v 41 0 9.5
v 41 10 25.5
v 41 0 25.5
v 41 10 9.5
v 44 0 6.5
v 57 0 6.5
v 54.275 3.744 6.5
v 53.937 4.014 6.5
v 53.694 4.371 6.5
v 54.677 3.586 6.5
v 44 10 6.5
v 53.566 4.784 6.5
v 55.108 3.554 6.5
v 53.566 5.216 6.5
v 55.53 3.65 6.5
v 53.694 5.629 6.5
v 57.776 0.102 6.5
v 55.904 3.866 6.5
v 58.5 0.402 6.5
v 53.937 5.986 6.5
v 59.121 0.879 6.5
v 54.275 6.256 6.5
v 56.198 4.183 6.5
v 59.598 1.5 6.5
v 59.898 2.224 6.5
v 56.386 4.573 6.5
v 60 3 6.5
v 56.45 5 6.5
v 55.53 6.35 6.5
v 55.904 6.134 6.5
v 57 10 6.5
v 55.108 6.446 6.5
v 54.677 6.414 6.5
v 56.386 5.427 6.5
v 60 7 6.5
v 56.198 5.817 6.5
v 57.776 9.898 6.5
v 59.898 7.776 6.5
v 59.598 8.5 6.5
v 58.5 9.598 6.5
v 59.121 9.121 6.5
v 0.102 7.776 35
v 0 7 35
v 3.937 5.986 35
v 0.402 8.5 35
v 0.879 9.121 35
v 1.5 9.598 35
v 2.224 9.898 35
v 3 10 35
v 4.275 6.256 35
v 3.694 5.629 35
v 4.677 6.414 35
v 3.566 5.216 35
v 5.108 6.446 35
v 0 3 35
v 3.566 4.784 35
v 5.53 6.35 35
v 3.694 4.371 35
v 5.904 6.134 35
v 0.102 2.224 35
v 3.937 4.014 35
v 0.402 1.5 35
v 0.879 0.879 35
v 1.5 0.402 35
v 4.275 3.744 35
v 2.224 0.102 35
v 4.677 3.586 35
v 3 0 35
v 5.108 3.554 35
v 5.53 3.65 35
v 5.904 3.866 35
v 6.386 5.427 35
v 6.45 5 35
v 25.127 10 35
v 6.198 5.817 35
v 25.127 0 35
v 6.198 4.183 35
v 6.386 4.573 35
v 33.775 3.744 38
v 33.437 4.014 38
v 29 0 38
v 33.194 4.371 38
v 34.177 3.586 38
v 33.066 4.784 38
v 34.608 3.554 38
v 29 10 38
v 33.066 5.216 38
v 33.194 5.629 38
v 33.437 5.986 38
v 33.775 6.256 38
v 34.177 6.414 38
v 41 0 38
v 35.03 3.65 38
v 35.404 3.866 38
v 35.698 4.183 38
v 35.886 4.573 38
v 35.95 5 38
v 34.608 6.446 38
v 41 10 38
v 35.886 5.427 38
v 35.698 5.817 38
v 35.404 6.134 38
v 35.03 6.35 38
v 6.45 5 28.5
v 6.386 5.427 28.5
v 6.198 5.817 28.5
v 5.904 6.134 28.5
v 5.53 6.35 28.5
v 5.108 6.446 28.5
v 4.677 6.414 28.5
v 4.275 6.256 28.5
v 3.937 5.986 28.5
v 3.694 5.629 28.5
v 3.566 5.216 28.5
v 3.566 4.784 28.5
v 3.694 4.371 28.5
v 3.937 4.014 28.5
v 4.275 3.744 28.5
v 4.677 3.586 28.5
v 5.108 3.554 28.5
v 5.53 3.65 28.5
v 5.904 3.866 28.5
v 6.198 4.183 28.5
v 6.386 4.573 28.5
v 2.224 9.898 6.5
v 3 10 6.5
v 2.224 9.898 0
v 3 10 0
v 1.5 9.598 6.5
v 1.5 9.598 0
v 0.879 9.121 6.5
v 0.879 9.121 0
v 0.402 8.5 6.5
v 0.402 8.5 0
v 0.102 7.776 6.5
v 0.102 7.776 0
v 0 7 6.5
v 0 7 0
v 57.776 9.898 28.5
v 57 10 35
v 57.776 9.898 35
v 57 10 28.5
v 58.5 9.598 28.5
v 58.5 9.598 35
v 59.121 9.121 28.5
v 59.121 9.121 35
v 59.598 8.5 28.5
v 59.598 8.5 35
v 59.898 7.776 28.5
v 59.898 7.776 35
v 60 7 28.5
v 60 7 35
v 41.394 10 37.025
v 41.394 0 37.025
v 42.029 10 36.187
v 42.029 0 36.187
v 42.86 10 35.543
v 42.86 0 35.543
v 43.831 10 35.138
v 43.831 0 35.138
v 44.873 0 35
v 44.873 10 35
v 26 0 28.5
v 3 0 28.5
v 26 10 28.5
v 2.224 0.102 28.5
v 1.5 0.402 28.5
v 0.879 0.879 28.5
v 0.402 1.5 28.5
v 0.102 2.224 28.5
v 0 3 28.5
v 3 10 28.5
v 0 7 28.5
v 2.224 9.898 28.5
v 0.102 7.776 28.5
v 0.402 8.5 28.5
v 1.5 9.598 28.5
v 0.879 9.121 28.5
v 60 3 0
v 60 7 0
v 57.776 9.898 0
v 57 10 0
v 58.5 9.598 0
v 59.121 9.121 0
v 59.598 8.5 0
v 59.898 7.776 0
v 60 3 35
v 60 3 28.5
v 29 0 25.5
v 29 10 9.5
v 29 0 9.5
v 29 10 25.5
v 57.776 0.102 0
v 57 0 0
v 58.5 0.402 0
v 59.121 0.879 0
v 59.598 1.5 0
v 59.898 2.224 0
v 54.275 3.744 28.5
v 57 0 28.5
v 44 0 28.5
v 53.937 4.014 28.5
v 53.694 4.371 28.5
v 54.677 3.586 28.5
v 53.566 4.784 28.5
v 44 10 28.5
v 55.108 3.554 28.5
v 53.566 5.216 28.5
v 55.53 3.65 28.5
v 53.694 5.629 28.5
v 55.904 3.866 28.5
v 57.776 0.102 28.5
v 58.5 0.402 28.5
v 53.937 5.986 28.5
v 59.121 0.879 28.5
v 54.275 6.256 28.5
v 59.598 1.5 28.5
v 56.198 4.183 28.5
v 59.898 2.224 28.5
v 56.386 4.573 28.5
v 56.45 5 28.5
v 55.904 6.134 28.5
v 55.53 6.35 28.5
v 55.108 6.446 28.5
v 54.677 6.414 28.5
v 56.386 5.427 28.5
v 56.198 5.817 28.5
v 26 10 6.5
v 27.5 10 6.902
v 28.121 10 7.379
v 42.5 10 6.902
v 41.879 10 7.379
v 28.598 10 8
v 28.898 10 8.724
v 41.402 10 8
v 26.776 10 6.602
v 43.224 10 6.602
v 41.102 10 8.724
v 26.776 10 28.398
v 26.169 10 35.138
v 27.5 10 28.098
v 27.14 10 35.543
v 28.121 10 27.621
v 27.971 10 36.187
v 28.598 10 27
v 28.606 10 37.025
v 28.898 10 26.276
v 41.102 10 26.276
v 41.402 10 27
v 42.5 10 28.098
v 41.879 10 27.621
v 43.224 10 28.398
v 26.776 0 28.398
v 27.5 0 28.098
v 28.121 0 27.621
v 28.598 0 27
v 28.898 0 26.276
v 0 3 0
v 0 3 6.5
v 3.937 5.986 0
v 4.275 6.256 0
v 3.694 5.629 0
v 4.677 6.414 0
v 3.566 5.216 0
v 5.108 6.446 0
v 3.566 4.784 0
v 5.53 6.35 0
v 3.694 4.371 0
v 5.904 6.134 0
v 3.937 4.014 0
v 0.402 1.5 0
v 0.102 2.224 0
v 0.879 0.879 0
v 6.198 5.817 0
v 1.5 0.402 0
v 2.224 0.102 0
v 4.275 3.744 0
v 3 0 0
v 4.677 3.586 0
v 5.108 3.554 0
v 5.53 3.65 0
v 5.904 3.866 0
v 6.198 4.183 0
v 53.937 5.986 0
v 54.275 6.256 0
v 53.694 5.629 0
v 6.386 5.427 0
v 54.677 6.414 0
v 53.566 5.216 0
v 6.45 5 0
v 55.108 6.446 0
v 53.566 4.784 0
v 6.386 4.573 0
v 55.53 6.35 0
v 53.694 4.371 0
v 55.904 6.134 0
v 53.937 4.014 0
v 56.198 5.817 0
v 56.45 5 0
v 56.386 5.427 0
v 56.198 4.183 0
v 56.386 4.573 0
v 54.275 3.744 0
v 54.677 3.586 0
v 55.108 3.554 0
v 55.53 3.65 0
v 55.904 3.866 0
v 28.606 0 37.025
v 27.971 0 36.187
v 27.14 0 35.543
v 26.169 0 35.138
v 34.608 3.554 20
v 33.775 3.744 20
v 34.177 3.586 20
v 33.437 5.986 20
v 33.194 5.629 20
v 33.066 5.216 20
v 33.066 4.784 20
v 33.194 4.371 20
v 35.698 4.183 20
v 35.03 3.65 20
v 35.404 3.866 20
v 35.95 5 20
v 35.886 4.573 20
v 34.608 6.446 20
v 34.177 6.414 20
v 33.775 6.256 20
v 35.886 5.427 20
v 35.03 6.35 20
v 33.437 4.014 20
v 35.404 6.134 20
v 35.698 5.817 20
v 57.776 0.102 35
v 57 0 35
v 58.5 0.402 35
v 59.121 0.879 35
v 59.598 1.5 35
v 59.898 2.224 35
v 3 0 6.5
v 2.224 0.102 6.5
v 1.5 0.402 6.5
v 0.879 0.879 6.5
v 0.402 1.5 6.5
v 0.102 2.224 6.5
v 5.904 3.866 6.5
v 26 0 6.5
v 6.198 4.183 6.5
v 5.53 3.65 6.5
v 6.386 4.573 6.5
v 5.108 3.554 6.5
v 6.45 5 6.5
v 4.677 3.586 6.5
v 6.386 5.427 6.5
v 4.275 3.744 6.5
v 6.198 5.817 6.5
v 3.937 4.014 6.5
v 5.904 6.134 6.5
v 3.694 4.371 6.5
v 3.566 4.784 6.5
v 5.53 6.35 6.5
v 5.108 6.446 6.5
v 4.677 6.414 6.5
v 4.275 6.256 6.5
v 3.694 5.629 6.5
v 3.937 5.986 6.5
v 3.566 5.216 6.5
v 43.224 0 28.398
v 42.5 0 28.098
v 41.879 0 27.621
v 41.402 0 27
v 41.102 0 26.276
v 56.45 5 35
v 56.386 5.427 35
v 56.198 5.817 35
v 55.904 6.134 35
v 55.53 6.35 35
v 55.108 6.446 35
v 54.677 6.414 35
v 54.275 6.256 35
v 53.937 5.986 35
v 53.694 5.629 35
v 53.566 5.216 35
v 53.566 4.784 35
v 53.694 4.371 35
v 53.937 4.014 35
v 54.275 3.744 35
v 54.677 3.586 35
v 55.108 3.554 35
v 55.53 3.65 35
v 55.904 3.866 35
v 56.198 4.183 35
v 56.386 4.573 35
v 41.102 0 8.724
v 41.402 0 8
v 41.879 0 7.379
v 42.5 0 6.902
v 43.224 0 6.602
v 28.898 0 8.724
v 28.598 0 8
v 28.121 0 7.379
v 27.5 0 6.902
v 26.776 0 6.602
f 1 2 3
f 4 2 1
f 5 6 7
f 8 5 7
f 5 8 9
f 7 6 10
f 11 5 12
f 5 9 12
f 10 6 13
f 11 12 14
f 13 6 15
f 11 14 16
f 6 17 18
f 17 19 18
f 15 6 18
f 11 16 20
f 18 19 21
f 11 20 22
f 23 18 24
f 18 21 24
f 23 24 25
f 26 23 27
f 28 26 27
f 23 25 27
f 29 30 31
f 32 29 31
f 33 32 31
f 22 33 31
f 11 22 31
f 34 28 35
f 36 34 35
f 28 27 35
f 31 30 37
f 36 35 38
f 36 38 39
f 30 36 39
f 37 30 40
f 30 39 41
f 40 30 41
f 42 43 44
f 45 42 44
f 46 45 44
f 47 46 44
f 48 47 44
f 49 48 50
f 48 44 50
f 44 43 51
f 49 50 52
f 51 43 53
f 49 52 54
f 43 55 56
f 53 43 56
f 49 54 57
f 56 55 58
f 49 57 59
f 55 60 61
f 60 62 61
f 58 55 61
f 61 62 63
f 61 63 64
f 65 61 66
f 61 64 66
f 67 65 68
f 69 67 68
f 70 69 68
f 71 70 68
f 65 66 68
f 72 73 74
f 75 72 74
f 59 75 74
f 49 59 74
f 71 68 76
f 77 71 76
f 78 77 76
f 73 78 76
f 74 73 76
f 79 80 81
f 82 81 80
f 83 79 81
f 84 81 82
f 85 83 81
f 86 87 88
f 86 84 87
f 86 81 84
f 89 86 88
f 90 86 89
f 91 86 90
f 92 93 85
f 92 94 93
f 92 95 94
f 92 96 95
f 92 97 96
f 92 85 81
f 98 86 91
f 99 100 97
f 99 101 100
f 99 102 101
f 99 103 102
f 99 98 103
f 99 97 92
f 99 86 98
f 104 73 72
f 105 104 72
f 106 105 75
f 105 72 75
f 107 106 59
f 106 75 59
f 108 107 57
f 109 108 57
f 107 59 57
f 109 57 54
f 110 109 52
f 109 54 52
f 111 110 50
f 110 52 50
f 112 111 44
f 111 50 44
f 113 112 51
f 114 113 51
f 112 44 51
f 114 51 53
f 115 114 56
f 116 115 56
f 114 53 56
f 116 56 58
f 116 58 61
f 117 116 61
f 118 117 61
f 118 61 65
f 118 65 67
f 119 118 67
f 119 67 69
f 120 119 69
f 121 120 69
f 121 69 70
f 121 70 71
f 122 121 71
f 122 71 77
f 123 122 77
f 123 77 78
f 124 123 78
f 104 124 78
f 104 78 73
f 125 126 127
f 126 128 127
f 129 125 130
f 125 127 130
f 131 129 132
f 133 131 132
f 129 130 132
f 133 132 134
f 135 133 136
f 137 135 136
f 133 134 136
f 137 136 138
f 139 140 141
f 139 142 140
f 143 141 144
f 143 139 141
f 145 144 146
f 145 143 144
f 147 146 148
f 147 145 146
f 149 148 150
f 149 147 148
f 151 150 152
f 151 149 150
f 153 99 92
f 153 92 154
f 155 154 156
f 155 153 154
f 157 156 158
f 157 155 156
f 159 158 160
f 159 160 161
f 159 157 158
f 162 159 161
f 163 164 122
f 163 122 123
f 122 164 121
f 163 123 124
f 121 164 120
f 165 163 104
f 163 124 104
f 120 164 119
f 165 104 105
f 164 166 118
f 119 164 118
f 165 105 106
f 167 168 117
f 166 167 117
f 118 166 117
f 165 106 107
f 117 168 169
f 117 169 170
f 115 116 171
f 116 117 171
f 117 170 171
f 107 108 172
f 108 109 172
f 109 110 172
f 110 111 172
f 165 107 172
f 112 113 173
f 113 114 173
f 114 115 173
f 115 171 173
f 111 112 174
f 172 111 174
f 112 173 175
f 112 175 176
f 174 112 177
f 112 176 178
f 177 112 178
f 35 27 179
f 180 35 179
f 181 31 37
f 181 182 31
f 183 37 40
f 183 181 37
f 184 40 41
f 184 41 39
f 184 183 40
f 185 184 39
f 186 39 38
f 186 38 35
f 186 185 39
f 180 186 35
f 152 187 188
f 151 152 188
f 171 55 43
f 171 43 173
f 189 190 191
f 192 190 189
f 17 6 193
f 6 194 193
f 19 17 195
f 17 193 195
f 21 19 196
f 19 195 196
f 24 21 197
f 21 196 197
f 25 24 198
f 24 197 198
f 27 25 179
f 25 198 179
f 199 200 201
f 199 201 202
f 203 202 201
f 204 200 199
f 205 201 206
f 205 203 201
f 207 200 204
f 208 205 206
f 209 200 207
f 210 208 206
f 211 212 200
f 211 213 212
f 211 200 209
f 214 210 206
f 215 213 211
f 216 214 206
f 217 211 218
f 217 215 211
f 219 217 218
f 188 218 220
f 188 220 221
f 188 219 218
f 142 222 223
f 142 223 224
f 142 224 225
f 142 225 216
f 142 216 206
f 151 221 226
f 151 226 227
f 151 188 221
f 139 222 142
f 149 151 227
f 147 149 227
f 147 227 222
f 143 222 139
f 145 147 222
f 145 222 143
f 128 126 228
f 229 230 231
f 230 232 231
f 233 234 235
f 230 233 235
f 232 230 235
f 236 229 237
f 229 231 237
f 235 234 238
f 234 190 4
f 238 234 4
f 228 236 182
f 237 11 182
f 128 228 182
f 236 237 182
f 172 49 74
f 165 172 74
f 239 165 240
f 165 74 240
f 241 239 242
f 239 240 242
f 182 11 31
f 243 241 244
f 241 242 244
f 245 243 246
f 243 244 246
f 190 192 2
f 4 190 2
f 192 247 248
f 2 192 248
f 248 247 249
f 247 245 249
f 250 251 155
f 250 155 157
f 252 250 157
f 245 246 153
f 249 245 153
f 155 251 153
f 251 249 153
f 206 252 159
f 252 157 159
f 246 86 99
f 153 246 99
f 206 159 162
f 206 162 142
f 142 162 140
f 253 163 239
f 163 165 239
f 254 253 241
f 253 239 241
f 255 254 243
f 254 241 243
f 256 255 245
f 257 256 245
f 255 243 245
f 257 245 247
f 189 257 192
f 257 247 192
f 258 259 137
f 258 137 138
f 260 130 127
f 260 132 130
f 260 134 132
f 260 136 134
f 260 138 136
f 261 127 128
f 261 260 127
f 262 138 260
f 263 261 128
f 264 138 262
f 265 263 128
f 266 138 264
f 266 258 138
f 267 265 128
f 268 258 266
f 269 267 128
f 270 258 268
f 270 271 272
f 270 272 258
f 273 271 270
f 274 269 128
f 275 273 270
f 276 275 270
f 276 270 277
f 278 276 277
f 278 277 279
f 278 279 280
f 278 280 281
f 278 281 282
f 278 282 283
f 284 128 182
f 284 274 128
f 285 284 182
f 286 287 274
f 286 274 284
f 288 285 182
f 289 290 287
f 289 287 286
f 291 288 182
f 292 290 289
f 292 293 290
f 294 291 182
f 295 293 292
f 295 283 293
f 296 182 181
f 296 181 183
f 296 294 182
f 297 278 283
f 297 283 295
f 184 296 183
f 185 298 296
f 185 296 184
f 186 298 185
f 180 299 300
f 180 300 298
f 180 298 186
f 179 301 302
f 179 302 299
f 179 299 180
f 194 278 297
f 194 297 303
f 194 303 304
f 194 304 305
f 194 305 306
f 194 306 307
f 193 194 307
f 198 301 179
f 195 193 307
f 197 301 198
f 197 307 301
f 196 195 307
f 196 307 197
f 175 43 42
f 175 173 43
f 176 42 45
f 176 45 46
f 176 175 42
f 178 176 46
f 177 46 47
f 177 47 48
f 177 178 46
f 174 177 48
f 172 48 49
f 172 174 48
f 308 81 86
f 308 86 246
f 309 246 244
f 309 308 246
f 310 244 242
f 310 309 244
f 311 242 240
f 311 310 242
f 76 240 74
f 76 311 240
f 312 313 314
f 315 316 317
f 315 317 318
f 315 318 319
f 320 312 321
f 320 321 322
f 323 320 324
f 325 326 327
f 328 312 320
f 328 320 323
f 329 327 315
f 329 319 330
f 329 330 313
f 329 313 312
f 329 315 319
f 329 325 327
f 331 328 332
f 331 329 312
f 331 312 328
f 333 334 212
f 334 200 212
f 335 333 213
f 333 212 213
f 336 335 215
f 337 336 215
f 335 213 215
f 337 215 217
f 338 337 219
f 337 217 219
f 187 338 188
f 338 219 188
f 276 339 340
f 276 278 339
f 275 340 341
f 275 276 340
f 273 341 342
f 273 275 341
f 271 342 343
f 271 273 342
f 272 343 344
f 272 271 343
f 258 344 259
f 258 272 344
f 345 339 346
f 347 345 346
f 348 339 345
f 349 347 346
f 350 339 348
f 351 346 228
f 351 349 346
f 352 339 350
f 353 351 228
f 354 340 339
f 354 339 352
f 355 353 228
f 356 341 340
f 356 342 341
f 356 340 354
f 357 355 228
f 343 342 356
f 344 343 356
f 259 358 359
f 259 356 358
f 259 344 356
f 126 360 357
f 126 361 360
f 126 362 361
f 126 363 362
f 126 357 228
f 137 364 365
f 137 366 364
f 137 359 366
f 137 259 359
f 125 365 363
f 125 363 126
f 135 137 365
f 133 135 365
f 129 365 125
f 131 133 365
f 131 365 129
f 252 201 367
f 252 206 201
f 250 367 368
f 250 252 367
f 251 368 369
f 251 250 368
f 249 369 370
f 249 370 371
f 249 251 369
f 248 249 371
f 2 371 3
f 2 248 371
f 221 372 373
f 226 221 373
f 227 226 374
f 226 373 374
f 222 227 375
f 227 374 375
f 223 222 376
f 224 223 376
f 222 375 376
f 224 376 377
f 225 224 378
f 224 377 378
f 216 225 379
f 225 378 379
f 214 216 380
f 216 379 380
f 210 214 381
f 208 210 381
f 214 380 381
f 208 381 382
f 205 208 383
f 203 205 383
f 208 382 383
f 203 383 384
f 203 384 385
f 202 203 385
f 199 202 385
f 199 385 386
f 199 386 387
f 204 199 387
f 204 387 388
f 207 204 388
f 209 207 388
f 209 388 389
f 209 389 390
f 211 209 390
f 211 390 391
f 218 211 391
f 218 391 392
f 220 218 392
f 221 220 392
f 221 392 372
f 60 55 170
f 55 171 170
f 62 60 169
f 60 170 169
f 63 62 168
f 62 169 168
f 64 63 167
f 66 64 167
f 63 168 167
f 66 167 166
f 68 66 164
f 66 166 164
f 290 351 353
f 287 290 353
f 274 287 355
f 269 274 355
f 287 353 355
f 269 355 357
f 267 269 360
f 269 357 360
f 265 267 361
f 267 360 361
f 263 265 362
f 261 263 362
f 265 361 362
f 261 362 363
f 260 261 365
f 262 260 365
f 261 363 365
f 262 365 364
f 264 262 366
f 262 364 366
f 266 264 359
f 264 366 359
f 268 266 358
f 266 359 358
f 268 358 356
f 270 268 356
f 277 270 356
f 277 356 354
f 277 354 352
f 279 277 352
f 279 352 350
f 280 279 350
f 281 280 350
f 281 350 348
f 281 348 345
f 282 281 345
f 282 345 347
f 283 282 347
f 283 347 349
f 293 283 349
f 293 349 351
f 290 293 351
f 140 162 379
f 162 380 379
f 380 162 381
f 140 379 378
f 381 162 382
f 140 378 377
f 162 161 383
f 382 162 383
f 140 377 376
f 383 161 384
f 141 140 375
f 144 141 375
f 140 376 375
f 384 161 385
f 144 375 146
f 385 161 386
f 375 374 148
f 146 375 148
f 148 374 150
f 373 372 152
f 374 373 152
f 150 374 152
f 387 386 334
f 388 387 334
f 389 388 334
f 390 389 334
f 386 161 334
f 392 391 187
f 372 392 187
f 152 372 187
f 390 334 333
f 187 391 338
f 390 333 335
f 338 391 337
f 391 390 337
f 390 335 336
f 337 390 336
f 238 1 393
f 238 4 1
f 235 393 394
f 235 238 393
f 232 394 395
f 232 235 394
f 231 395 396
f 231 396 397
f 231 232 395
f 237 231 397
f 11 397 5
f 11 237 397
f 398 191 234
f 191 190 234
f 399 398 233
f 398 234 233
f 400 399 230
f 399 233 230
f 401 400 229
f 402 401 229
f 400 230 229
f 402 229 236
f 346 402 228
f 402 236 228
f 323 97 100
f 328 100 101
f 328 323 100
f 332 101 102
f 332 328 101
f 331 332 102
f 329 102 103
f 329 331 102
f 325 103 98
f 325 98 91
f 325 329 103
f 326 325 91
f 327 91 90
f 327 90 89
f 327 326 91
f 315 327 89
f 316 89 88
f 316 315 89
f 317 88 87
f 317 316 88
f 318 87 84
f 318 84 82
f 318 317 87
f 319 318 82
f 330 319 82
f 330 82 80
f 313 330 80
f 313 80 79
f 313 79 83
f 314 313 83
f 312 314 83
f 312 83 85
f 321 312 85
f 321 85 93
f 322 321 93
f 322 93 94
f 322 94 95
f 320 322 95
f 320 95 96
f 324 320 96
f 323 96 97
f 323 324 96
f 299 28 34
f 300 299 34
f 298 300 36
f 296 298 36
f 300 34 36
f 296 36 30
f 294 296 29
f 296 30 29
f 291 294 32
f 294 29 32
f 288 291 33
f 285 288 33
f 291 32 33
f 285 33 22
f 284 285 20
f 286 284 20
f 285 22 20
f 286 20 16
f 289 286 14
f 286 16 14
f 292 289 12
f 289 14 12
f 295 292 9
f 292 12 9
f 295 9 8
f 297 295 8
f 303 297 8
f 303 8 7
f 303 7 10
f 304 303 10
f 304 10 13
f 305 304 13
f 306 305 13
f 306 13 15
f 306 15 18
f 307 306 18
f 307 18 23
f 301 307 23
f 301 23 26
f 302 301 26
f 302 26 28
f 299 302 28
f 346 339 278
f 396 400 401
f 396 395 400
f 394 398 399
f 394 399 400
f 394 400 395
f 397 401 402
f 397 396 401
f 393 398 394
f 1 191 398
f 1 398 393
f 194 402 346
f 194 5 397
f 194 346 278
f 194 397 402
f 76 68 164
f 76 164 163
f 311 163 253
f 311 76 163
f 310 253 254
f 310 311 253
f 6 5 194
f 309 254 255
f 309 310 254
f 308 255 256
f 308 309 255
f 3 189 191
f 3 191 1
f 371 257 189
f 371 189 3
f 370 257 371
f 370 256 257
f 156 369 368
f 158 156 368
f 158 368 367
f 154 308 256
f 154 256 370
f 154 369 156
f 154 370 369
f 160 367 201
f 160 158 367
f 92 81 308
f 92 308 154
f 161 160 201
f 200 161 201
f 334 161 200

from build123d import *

# Parameters (mm, degrees)
SKETCH1_W               = 60
SKETCH1_H               = 35
BOSS_EXTRUDE1_DEPTH     = 10
SKETCH2_W               = 22
SKETCH2_H               = 10
CUT_EXTRUDE1_DEPTH      = 19
SKETCH3_W               = 22
SKETCH3_H               = 10
CUT_EXTRUDE2_DEPTH      = 29
SKETCH5_R               = 1.45
CUT_EXTRUDE4_DEPTH      = 71.178344238
FILLET1_R               = 3
FILLET2_R               = 3
SKETCH7_W               = 12
SKETCH7_H               = 10
BOSS_EXTRUDE2_DEPTH     = 3
CUT_EXTRUDE5_DEPTH      = 3
CUT_EXTRUDE5_DEPTH_BACK = 15
SKETCH6_R               = 1.45
FILLET3_R               = 4


with BuildPart() as part:
    # Sketch1 → Boss-Extrude1 (new body)
    with BuildSketch(Plane(origin=(0, 0, 0), x_dir=(1, 0, 0), z_dir=(0, 1, 0))):
        with Locations((30, -17.5)):
            Rectangle(SKETCH1_W, SKETCH1_H)
    extrude(amount=BOSS_EXTRUDE1_DEPTH)

    # Sketch2 → Cut-Extrude1 (cut)
    with BuildSketch(Plane(origin=(60, 0, 0), x_dir=(0, 0, -1), z_dir=(1, 0, 0))):
        with Locations((-17.5, 5)):
            Rectangle(SKETCH2_W, SKETCH2_H)
    extrude(amount=-CUT_EXTRUDE1_DEPTH, mode=Mode.SUBTRACT)

    # Sketch3 → Cut-Extrude2 (cut)
    with BuildSketch(Plane.ZY):
        with Locations((17.5, 5)):
            Rectangle(SKETCH3_W, SKETCH3_H)
    extrude(amount=-CUT_EXTRUDE2_DEPTH, mode=Mode.SUBTRACT)

    # Sketch5 → Cut-Extrude4 (cut, through all)
    with BuildSketch(Plane.XY.offset(35)):
        with Locations((5, 5)):
            Circle(SKETCH5_R)
        with Locations((55, 5)):
            Circle(SKETCH5_R)
    extrude(amount=-CUT_EXTRUDE4_DEPTH, mode=Mode.SUBTRACT)

    # Fillet1
    fillet1_edges = [part.edges().sort_by_distance(p)[0] for p in [
        (60, 10, 31.75),
        (60, 0, 3.25),
        (60, 10, 3.25),
        (0, 0, 31.75),
        (0, 10, 31.75),
        (0, 10, 3.25),
        (60, 0, 31.75),
        (0, 0, 3.25),
    ]]
    fillet(fillet1_edges, radius=FILLET1_R)

    # Fillet2
    fillet2_edges = [part.edges().sort_by_distance(p)[0] for p in [
        (41, 5, 28.5),
        (41, 5, 6.5),
        (29, 5, 6.5),
        (29, 5, 28.5),
    ]]
    fillet(fillet2_edges, radius=FILLET2_R)

    # Sketch7 → Boss-Extrude2 (add)
    with BuildSketch(Plane.XY.offset(35)):
        with Locations((35, 5)):
            Rectangle(SKETCH7_W, SKETCH7_H)
    extrude(amount=BOSS_EXTRUDE2_DEPTH)

    # Sketch6 → Cut-Extrude5 (cut, two sides: drawn at the far end of the back side and taken through both)
    with BuildSketch(Plane.XY.offset(35).offset(-CUT_EXTRUDE5_DEPTH_BACK)):
        with Locations((34.5, 5)):
            Circle(SKETCH6_R)
    extrude(amount=CUT_EXTRUDE5_DEPTH + CUT_EXTRUDE5_DEPTH_BACK, mode=Mode.SUBTRACT)

    # Fillet3
    # the kernel refuses this fillet: 4 mm, written as the material it adds along each edge
    with BuildSketch(Plane(origin=(41, 10, 35), x_dir=(0, 0, 1), z_dir=(0, -1, 0))) as fillet3_piece_1:
        with BuildLine():
            CenterArc((4, -3.872983346), FILLET3_R, 104.477512186, 75.522487814)
            Line((0, -3.872983346), (-0.08, -3.872983346))
            Line((-0.08, -3.872983346), (-0.08, 0))
            Line((-0.08, 0), (0, 0.08))
            ThreePointArc((0, 0.08), (1.5, 0.08), (2.98, 0.077459667))
            Line((2.98, 0.077459667), (3, 0))
        make_face()
    extrude(amount=10)
    with BuildSketch(Plane(origin=(29, 0, 35), x_dir=(-1, 0, 0), z_dir=(0, 1, 0))) as fillet3_piece_2:
        with BuildLine():
            CenterArc((3.872983346, 4), FILLET3_R, 194.477512186, 75.522487814)
            Line((0, 3), (-0.077459667, 2.98))
            ThreePointArc((-0.077459667, 2.98), (-0.08, 1.5), (-0.08, 0))
            Line((-0.08, 0), (0, -0.08))
            Line((0, -0.08), (3.872983346, -0.08))
            Line((3.872983346, -0.08), (3.872983346, 0))
        make_face()
    extrude(amount=10)


solid = part.part
